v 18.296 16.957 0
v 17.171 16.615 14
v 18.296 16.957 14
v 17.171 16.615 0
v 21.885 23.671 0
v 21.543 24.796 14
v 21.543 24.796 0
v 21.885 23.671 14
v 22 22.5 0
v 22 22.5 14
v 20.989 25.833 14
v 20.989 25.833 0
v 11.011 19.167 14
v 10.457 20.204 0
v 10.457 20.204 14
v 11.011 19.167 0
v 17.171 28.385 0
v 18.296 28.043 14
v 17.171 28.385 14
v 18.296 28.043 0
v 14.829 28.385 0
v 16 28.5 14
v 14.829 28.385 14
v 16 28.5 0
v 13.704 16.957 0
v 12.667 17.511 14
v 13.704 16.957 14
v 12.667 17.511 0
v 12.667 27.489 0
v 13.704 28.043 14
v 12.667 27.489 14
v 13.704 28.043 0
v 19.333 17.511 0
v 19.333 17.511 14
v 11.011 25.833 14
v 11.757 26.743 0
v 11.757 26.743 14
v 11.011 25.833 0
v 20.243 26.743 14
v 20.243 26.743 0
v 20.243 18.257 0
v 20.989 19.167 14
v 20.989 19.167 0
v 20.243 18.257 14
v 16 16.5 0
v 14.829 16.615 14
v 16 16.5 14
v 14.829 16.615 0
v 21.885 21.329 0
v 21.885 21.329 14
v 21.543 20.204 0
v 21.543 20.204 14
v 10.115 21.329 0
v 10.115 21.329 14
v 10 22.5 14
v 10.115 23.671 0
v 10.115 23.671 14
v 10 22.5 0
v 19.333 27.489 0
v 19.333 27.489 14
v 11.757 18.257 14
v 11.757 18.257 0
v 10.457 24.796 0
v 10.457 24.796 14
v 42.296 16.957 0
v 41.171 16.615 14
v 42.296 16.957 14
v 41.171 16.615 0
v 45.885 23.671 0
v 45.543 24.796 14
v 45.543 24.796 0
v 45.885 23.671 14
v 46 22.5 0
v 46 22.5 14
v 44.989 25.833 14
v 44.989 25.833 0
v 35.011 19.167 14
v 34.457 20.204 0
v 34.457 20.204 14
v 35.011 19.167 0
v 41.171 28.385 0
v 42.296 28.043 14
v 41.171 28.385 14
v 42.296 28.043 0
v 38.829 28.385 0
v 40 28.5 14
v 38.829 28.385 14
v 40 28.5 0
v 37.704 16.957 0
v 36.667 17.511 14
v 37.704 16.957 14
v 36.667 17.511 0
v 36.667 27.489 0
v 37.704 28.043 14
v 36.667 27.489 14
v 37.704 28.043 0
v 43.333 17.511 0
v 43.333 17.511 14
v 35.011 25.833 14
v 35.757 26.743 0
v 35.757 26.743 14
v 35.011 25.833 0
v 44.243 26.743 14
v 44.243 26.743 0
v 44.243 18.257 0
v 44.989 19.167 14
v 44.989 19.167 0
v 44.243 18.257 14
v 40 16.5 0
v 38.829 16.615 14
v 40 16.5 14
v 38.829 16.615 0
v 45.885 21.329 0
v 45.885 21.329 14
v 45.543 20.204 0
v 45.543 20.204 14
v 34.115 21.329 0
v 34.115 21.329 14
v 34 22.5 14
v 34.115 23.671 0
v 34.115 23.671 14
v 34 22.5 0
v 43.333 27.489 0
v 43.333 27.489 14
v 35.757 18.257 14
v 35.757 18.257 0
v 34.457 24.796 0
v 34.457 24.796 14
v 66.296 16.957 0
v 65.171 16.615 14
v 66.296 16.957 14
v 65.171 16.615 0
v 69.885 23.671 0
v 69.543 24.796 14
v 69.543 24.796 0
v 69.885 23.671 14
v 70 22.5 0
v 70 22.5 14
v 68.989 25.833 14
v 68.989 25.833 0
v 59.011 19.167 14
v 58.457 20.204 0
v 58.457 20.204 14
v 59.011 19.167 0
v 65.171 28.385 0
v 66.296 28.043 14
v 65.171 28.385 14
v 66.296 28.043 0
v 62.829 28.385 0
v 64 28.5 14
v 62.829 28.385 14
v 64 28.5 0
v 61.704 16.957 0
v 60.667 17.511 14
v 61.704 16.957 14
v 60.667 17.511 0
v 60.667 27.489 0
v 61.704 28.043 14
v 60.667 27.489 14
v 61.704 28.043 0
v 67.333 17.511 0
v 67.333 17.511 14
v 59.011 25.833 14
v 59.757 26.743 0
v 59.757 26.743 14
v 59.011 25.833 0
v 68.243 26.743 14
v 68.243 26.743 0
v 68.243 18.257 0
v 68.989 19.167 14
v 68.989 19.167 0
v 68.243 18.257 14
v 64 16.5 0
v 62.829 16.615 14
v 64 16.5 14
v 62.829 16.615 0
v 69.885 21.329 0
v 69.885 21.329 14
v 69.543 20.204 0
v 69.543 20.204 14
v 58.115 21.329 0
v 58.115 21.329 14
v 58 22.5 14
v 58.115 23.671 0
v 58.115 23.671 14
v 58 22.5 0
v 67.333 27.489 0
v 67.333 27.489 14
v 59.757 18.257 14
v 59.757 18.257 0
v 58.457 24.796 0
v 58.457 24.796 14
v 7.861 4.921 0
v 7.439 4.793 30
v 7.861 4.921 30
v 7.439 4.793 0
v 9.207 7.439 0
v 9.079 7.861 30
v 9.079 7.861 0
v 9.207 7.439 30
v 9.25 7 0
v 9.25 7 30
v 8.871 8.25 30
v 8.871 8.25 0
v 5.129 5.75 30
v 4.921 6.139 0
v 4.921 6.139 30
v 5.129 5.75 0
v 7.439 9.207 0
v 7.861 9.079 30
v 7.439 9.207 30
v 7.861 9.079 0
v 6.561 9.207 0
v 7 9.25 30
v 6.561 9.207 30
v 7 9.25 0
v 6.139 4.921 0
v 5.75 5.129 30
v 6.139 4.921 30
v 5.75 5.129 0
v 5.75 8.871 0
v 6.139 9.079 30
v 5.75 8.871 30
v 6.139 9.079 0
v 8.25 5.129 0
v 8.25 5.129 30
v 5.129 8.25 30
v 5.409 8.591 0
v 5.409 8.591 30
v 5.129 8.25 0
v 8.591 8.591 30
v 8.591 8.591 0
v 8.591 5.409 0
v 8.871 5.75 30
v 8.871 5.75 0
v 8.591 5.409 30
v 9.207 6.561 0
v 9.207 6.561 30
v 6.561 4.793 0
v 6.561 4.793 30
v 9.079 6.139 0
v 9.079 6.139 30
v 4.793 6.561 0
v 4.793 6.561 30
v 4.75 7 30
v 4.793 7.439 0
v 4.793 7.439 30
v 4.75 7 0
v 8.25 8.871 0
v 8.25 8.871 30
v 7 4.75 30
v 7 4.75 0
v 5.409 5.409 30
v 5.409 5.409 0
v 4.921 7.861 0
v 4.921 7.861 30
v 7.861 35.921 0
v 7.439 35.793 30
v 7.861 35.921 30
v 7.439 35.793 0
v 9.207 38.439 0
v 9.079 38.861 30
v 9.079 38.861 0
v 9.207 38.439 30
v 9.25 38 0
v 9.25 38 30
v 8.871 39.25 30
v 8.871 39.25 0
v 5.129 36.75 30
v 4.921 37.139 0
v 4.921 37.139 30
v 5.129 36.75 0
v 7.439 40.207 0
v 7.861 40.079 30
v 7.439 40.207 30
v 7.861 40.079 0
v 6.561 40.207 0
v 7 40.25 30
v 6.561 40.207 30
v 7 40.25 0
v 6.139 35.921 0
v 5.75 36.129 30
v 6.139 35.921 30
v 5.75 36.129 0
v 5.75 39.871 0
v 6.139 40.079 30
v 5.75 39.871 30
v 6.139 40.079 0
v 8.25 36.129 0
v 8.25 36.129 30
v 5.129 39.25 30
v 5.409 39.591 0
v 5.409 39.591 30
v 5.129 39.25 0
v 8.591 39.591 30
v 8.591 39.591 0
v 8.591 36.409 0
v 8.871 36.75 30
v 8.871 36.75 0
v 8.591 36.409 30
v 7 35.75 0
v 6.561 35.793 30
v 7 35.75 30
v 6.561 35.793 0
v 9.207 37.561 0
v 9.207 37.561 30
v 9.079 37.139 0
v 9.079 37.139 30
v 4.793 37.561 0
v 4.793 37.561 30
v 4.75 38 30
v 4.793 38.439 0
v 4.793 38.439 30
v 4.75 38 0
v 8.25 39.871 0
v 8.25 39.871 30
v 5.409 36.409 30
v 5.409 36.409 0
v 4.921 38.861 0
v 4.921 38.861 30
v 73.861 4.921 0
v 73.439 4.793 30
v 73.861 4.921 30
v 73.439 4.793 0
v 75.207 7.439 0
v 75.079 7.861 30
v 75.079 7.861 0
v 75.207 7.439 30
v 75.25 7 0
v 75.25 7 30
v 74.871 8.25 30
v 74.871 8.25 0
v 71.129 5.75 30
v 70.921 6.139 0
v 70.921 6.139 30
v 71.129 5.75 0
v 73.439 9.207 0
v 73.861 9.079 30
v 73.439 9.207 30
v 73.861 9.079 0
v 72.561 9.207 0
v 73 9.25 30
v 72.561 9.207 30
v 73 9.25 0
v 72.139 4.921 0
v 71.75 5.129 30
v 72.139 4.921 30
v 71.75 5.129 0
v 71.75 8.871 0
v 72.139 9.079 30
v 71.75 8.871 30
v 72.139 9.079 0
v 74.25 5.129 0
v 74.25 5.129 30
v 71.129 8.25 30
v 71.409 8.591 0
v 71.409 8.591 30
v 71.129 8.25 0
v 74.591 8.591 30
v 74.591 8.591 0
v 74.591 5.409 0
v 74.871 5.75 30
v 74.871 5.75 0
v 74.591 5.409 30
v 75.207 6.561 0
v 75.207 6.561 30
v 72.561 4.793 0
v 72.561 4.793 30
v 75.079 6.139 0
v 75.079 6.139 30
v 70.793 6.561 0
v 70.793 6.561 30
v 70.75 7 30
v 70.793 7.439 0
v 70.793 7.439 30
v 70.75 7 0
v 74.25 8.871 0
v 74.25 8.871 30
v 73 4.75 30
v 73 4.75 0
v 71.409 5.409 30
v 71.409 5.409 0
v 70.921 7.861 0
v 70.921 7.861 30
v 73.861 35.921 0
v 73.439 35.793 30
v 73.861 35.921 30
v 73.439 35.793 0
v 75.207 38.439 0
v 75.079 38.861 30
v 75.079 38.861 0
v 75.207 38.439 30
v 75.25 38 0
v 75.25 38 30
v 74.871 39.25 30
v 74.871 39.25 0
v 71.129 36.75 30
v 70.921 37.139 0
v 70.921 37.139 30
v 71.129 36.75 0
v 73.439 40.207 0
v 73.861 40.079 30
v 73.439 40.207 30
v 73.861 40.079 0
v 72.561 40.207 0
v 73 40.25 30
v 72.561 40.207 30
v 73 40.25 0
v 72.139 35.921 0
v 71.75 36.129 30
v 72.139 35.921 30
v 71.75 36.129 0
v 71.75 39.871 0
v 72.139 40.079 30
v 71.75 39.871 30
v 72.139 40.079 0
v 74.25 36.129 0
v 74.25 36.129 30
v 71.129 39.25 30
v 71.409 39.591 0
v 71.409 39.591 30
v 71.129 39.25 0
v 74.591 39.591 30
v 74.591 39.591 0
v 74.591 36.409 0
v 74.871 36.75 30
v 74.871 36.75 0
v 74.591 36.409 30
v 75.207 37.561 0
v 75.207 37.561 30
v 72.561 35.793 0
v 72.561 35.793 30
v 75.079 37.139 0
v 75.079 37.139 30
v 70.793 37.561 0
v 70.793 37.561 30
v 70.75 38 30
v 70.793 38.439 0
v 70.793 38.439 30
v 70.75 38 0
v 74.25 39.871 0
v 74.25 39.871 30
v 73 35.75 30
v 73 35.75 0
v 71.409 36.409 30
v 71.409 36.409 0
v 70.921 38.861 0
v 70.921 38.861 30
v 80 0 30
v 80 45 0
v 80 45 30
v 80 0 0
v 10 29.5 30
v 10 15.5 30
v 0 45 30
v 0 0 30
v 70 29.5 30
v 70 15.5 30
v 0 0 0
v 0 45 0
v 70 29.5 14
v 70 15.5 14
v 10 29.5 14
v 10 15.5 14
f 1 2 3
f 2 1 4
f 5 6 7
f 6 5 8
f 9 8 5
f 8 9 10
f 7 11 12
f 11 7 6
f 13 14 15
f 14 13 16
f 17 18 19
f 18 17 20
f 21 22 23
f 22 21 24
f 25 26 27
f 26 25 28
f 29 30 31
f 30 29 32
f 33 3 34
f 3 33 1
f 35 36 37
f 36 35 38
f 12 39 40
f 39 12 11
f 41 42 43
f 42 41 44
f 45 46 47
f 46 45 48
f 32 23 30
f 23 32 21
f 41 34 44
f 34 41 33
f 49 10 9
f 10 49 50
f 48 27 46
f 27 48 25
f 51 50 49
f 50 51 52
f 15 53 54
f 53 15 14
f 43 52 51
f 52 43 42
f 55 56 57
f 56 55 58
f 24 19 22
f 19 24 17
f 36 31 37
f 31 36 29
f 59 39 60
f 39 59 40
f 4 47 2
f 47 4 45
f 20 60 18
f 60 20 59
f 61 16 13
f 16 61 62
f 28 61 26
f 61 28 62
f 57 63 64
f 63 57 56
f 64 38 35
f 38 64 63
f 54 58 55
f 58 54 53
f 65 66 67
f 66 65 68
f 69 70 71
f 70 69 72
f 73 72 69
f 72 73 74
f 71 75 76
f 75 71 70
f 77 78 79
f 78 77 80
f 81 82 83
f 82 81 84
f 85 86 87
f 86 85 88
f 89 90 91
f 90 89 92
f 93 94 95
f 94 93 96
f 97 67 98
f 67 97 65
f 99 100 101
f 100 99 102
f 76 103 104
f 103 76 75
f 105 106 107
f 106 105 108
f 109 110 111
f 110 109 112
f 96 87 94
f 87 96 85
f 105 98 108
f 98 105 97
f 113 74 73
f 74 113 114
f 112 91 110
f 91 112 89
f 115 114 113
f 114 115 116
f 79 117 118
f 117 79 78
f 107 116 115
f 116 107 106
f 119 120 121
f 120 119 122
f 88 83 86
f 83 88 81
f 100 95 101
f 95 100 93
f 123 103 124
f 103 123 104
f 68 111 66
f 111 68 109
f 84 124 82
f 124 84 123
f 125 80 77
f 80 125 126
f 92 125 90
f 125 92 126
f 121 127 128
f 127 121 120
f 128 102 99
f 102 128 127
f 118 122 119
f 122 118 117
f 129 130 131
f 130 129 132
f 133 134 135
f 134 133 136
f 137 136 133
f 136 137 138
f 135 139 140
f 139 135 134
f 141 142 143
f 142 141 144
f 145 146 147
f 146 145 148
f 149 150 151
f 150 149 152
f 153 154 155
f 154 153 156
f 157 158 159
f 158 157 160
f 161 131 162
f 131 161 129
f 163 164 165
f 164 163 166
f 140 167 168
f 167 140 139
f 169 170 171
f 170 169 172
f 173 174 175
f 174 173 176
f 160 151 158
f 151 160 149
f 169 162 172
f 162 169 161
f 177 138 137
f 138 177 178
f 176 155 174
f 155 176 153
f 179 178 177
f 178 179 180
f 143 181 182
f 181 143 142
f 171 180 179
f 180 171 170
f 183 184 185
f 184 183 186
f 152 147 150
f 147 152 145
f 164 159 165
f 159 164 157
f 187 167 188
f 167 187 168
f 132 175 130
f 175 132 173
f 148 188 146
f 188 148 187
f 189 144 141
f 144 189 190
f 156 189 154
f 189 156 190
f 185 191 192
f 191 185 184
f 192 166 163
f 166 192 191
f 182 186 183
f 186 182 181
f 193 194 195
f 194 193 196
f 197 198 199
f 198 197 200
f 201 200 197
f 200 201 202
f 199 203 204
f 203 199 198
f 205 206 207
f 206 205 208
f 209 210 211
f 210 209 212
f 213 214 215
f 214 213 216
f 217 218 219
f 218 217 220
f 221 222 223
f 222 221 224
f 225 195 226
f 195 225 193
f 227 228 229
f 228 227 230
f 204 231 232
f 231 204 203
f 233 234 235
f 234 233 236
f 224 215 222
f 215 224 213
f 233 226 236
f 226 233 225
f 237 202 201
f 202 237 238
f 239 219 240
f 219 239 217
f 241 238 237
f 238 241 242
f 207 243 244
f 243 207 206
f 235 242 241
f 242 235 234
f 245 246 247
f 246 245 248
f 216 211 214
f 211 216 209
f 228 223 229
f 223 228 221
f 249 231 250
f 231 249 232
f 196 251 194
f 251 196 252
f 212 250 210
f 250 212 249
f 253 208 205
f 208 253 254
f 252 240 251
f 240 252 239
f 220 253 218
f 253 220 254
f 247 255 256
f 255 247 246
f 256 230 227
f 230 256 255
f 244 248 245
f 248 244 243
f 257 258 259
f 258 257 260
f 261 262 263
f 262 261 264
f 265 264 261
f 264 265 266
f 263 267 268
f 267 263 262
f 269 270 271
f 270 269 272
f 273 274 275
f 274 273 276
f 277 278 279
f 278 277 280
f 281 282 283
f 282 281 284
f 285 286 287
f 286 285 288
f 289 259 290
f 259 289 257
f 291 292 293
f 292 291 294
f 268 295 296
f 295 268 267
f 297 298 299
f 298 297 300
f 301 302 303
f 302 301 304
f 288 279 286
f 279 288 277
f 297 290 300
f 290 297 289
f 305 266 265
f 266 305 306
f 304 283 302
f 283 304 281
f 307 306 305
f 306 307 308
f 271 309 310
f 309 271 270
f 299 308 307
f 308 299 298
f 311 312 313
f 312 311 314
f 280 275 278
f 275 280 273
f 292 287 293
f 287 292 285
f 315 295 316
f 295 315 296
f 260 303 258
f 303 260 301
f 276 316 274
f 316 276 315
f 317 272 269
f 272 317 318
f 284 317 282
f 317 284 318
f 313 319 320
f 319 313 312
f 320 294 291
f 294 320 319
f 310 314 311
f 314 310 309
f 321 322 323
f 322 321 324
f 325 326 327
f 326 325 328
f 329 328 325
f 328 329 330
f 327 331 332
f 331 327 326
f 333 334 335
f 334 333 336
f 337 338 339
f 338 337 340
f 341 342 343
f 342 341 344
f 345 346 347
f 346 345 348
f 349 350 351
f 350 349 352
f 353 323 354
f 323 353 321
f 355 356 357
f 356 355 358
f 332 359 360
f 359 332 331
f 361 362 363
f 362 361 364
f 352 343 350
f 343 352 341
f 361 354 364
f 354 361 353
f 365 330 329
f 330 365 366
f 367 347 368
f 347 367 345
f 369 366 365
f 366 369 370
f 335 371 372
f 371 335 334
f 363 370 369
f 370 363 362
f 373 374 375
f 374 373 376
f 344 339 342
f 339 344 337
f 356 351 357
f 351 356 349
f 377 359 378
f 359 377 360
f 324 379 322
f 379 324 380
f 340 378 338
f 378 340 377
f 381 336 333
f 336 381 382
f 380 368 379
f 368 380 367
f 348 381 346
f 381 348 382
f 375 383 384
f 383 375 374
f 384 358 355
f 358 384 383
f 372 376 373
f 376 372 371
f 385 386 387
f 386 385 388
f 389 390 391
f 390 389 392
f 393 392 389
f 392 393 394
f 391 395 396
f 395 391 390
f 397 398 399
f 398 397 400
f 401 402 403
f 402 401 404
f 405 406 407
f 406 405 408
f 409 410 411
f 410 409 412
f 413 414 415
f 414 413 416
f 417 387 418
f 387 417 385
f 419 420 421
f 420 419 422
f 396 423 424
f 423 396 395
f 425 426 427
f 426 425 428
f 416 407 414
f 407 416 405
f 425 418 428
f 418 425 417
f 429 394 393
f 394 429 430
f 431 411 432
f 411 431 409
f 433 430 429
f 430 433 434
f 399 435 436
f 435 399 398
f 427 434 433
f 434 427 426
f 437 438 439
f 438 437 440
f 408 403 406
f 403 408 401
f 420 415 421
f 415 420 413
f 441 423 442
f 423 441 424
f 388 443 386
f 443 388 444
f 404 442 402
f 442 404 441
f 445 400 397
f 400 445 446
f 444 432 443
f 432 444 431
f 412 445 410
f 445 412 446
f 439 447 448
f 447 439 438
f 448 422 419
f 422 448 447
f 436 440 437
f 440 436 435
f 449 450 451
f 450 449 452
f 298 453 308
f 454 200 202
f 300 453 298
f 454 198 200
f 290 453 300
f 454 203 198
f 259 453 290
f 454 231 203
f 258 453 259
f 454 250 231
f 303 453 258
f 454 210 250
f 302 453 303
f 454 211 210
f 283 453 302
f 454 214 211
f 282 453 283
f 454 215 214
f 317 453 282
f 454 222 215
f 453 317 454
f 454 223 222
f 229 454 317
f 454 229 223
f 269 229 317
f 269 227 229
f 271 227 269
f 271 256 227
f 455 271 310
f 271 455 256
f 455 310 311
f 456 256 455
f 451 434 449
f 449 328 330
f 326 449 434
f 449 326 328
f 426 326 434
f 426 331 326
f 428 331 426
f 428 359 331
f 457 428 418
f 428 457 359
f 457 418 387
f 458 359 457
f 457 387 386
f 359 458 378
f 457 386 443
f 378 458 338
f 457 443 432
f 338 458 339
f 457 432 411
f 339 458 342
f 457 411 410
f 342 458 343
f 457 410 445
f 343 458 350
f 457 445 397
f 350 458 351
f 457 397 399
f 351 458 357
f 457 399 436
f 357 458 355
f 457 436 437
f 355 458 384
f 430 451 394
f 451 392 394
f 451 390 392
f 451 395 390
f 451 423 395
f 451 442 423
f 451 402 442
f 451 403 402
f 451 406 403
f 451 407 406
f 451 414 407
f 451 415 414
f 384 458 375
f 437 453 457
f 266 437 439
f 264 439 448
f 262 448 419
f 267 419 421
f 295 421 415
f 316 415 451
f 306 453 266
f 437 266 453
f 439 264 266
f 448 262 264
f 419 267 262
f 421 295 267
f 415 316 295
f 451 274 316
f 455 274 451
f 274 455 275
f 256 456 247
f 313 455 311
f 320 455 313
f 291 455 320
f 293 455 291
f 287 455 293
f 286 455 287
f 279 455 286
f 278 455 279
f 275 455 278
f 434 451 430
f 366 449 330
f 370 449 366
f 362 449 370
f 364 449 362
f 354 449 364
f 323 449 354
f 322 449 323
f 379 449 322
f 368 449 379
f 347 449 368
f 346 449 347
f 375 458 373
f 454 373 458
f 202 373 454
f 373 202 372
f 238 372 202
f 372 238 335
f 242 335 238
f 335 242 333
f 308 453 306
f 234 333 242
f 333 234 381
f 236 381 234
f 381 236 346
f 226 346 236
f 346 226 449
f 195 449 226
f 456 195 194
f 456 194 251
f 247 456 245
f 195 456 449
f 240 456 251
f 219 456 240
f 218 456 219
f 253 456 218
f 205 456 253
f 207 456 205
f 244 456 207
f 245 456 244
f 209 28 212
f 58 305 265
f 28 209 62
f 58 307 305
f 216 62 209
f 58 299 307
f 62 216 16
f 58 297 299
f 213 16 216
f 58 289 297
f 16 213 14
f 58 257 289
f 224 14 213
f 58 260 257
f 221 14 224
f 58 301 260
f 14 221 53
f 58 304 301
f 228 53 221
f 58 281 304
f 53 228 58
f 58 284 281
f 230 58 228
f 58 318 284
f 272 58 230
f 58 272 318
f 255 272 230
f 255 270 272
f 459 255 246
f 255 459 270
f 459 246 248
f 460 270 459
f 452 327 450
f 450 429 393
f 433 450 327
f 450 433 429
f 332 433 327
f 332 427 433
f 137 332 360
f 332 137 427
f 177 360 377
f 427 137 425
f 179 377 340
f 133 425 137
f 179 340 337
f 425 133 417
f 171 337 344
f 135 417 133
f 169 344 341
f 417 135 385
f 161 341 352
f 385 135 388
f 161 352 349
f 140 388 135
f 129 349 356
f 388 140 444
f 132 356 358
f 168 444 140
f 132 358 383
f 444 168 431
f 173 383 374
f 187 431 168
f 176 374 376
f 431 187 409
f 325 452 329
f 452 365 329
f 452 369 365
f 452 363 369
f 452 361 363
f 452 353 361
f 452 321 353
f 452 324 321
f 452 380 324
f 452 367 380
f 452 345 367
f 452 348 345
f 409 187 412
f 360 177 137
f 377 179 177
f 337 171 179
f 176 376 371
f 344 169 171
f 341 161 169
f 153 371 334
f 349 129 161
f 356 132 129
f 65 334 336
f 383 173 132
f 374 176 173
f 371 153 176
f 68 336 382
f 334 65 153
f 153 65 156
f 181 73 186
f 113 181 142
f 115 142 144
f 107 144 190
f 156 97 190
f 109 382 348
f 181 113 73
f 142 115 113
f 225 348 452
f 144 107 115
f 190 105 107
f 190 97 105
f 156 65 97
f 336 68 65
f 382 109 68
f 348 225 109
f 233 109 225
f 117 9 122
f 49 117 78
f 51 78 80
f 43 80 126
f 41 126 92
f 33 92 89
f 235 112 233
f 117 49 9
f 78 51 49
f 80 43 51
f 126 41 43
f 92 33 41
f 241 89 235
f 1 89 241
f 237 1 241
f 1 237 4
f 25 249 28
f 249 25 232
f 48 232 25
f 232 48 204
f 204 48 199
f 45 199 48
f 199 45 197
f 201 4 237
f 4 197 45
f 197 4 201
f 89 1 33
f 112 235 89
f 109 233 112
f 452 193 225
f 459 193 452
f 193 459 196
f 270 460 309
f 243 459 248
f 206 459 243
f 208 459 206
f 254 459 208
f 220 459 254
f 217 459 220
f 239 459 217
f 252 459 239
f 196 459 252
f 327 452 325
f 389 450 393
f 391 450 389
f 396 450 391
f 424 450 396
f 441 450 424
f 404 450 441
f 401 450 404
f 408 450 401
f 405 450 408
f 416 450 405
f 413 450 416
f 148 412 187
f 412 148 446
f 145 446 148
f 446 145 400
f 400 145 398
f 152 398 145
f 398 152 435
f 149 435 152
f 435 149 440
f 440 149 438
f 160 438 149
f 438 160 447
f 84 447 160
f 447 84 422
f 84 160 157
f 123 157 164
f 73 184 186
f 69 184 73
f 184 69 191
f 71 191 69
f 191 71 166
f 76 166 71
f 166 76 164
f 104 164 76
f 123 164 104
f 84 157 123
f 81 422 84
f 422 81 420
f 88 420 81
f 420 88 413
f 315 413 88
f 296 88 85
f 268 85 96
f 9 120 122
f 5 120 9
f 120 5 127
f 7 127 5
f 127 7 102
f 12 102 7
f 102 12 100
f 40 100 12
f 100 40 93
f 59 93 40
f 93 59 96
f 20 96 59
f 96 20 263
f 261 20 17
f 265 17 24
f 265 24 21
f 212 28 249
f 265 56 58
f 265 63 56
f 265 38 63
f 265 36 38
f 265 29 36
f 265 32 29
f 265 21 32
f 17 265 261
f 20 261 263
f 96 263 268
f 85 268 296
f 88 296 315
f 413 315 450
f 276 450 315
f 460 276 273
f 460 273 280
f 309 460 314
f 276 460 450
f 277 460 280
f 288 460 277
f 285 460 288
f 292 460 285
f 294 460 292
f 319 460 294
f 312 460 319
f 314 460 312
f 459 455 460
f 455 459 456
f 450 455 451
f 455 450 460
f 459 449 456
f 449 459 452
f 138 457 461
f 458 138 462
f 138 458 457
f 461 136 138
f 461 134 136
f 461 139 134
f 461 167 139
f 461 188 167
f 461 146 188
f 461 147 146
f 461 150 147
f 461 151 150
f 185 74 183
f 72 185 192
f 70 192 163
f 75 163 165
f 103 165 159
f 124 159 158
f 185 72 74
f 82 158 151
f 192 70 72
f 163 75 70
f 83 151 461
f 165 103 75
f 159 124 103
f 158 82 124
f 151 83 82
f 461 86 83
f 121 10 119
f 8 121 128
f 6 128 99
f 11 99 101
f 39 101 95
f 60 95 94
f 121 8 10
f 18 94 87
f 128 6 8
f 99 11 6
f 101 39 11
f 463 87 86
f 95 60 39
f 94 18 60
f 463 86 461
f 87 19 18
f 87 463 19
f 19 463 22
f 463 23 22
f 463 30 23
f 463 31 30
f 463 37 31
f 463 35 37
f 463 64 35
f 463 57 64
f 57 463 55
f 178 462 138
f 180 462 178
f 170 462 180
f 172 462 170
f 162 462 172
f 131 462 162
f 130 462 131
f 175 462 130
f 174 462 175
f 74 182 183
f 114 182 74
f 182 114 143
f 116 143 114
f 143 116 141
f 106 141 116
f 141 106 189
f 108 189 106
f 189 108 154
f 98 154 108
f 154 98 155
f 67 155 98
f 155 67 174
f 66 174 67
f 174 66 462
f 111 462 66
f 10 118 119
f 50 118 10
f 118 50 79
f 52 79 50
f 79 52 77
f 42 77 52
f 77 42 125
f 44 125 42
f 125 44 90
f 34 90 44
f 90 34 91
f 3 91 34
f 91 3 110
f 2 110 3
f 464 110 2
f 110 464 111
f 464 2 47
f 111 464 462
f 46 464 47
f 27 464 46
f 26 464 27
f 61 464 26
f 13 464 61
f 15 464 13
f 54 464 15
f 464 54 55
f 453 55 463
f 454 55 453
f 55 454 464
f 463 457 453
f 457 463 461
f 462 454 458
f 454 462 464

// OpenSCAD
$fn = 32;

// ----------------------------------------------------------------------
// Manifold block: gallery_top manifold
// ----------------------------------------------------------------------

// --- parameters (mm) ---
block_l = 80;             // block length, X
block_w = 45;             // block width, Y
block_h = 30;             // block height, Z
port_d = 12;              // port bore diameter
port_pitch = 24;          // port pitch along X
gallery_d = 14;           // top gallery width, Y
gallery_depth = 16;       // gallery pocket depth
wall_p = 10;              // gallery end wall thickness, X
mnt_d = 4.5;              // mounting hole diameter
mnt_in = 7;               // mounting hole inset from the edges

n_ports = 3;  // ports in the row
port_x0 = (block_l - (n_ports - 1) * port_pitch) / 2;  // first port X

difference() {
  cube([block_l, block_w, block_h]);
  for (i = [0 : n_ports - 1])
    translate([port_x0 + i * port_pitch, block_w / 2, -1])
      cylinder(h = block_h + 2, d = port_d);
  translate([wall_p, block_w / 2 - gallery_d / 2, block_h - gallery_depth])
    cube([block_l - 2 * wall_p, gallery_d, gallery_depth + 1]);
  for (cx = [mnt_in, block_l - mnt_in])
    for (cy = [mnt_in, block_w - mnt_in])
      translate([cx, cy, -1]) cylinder(h = block_h + 2, d = mnt_d);
}
